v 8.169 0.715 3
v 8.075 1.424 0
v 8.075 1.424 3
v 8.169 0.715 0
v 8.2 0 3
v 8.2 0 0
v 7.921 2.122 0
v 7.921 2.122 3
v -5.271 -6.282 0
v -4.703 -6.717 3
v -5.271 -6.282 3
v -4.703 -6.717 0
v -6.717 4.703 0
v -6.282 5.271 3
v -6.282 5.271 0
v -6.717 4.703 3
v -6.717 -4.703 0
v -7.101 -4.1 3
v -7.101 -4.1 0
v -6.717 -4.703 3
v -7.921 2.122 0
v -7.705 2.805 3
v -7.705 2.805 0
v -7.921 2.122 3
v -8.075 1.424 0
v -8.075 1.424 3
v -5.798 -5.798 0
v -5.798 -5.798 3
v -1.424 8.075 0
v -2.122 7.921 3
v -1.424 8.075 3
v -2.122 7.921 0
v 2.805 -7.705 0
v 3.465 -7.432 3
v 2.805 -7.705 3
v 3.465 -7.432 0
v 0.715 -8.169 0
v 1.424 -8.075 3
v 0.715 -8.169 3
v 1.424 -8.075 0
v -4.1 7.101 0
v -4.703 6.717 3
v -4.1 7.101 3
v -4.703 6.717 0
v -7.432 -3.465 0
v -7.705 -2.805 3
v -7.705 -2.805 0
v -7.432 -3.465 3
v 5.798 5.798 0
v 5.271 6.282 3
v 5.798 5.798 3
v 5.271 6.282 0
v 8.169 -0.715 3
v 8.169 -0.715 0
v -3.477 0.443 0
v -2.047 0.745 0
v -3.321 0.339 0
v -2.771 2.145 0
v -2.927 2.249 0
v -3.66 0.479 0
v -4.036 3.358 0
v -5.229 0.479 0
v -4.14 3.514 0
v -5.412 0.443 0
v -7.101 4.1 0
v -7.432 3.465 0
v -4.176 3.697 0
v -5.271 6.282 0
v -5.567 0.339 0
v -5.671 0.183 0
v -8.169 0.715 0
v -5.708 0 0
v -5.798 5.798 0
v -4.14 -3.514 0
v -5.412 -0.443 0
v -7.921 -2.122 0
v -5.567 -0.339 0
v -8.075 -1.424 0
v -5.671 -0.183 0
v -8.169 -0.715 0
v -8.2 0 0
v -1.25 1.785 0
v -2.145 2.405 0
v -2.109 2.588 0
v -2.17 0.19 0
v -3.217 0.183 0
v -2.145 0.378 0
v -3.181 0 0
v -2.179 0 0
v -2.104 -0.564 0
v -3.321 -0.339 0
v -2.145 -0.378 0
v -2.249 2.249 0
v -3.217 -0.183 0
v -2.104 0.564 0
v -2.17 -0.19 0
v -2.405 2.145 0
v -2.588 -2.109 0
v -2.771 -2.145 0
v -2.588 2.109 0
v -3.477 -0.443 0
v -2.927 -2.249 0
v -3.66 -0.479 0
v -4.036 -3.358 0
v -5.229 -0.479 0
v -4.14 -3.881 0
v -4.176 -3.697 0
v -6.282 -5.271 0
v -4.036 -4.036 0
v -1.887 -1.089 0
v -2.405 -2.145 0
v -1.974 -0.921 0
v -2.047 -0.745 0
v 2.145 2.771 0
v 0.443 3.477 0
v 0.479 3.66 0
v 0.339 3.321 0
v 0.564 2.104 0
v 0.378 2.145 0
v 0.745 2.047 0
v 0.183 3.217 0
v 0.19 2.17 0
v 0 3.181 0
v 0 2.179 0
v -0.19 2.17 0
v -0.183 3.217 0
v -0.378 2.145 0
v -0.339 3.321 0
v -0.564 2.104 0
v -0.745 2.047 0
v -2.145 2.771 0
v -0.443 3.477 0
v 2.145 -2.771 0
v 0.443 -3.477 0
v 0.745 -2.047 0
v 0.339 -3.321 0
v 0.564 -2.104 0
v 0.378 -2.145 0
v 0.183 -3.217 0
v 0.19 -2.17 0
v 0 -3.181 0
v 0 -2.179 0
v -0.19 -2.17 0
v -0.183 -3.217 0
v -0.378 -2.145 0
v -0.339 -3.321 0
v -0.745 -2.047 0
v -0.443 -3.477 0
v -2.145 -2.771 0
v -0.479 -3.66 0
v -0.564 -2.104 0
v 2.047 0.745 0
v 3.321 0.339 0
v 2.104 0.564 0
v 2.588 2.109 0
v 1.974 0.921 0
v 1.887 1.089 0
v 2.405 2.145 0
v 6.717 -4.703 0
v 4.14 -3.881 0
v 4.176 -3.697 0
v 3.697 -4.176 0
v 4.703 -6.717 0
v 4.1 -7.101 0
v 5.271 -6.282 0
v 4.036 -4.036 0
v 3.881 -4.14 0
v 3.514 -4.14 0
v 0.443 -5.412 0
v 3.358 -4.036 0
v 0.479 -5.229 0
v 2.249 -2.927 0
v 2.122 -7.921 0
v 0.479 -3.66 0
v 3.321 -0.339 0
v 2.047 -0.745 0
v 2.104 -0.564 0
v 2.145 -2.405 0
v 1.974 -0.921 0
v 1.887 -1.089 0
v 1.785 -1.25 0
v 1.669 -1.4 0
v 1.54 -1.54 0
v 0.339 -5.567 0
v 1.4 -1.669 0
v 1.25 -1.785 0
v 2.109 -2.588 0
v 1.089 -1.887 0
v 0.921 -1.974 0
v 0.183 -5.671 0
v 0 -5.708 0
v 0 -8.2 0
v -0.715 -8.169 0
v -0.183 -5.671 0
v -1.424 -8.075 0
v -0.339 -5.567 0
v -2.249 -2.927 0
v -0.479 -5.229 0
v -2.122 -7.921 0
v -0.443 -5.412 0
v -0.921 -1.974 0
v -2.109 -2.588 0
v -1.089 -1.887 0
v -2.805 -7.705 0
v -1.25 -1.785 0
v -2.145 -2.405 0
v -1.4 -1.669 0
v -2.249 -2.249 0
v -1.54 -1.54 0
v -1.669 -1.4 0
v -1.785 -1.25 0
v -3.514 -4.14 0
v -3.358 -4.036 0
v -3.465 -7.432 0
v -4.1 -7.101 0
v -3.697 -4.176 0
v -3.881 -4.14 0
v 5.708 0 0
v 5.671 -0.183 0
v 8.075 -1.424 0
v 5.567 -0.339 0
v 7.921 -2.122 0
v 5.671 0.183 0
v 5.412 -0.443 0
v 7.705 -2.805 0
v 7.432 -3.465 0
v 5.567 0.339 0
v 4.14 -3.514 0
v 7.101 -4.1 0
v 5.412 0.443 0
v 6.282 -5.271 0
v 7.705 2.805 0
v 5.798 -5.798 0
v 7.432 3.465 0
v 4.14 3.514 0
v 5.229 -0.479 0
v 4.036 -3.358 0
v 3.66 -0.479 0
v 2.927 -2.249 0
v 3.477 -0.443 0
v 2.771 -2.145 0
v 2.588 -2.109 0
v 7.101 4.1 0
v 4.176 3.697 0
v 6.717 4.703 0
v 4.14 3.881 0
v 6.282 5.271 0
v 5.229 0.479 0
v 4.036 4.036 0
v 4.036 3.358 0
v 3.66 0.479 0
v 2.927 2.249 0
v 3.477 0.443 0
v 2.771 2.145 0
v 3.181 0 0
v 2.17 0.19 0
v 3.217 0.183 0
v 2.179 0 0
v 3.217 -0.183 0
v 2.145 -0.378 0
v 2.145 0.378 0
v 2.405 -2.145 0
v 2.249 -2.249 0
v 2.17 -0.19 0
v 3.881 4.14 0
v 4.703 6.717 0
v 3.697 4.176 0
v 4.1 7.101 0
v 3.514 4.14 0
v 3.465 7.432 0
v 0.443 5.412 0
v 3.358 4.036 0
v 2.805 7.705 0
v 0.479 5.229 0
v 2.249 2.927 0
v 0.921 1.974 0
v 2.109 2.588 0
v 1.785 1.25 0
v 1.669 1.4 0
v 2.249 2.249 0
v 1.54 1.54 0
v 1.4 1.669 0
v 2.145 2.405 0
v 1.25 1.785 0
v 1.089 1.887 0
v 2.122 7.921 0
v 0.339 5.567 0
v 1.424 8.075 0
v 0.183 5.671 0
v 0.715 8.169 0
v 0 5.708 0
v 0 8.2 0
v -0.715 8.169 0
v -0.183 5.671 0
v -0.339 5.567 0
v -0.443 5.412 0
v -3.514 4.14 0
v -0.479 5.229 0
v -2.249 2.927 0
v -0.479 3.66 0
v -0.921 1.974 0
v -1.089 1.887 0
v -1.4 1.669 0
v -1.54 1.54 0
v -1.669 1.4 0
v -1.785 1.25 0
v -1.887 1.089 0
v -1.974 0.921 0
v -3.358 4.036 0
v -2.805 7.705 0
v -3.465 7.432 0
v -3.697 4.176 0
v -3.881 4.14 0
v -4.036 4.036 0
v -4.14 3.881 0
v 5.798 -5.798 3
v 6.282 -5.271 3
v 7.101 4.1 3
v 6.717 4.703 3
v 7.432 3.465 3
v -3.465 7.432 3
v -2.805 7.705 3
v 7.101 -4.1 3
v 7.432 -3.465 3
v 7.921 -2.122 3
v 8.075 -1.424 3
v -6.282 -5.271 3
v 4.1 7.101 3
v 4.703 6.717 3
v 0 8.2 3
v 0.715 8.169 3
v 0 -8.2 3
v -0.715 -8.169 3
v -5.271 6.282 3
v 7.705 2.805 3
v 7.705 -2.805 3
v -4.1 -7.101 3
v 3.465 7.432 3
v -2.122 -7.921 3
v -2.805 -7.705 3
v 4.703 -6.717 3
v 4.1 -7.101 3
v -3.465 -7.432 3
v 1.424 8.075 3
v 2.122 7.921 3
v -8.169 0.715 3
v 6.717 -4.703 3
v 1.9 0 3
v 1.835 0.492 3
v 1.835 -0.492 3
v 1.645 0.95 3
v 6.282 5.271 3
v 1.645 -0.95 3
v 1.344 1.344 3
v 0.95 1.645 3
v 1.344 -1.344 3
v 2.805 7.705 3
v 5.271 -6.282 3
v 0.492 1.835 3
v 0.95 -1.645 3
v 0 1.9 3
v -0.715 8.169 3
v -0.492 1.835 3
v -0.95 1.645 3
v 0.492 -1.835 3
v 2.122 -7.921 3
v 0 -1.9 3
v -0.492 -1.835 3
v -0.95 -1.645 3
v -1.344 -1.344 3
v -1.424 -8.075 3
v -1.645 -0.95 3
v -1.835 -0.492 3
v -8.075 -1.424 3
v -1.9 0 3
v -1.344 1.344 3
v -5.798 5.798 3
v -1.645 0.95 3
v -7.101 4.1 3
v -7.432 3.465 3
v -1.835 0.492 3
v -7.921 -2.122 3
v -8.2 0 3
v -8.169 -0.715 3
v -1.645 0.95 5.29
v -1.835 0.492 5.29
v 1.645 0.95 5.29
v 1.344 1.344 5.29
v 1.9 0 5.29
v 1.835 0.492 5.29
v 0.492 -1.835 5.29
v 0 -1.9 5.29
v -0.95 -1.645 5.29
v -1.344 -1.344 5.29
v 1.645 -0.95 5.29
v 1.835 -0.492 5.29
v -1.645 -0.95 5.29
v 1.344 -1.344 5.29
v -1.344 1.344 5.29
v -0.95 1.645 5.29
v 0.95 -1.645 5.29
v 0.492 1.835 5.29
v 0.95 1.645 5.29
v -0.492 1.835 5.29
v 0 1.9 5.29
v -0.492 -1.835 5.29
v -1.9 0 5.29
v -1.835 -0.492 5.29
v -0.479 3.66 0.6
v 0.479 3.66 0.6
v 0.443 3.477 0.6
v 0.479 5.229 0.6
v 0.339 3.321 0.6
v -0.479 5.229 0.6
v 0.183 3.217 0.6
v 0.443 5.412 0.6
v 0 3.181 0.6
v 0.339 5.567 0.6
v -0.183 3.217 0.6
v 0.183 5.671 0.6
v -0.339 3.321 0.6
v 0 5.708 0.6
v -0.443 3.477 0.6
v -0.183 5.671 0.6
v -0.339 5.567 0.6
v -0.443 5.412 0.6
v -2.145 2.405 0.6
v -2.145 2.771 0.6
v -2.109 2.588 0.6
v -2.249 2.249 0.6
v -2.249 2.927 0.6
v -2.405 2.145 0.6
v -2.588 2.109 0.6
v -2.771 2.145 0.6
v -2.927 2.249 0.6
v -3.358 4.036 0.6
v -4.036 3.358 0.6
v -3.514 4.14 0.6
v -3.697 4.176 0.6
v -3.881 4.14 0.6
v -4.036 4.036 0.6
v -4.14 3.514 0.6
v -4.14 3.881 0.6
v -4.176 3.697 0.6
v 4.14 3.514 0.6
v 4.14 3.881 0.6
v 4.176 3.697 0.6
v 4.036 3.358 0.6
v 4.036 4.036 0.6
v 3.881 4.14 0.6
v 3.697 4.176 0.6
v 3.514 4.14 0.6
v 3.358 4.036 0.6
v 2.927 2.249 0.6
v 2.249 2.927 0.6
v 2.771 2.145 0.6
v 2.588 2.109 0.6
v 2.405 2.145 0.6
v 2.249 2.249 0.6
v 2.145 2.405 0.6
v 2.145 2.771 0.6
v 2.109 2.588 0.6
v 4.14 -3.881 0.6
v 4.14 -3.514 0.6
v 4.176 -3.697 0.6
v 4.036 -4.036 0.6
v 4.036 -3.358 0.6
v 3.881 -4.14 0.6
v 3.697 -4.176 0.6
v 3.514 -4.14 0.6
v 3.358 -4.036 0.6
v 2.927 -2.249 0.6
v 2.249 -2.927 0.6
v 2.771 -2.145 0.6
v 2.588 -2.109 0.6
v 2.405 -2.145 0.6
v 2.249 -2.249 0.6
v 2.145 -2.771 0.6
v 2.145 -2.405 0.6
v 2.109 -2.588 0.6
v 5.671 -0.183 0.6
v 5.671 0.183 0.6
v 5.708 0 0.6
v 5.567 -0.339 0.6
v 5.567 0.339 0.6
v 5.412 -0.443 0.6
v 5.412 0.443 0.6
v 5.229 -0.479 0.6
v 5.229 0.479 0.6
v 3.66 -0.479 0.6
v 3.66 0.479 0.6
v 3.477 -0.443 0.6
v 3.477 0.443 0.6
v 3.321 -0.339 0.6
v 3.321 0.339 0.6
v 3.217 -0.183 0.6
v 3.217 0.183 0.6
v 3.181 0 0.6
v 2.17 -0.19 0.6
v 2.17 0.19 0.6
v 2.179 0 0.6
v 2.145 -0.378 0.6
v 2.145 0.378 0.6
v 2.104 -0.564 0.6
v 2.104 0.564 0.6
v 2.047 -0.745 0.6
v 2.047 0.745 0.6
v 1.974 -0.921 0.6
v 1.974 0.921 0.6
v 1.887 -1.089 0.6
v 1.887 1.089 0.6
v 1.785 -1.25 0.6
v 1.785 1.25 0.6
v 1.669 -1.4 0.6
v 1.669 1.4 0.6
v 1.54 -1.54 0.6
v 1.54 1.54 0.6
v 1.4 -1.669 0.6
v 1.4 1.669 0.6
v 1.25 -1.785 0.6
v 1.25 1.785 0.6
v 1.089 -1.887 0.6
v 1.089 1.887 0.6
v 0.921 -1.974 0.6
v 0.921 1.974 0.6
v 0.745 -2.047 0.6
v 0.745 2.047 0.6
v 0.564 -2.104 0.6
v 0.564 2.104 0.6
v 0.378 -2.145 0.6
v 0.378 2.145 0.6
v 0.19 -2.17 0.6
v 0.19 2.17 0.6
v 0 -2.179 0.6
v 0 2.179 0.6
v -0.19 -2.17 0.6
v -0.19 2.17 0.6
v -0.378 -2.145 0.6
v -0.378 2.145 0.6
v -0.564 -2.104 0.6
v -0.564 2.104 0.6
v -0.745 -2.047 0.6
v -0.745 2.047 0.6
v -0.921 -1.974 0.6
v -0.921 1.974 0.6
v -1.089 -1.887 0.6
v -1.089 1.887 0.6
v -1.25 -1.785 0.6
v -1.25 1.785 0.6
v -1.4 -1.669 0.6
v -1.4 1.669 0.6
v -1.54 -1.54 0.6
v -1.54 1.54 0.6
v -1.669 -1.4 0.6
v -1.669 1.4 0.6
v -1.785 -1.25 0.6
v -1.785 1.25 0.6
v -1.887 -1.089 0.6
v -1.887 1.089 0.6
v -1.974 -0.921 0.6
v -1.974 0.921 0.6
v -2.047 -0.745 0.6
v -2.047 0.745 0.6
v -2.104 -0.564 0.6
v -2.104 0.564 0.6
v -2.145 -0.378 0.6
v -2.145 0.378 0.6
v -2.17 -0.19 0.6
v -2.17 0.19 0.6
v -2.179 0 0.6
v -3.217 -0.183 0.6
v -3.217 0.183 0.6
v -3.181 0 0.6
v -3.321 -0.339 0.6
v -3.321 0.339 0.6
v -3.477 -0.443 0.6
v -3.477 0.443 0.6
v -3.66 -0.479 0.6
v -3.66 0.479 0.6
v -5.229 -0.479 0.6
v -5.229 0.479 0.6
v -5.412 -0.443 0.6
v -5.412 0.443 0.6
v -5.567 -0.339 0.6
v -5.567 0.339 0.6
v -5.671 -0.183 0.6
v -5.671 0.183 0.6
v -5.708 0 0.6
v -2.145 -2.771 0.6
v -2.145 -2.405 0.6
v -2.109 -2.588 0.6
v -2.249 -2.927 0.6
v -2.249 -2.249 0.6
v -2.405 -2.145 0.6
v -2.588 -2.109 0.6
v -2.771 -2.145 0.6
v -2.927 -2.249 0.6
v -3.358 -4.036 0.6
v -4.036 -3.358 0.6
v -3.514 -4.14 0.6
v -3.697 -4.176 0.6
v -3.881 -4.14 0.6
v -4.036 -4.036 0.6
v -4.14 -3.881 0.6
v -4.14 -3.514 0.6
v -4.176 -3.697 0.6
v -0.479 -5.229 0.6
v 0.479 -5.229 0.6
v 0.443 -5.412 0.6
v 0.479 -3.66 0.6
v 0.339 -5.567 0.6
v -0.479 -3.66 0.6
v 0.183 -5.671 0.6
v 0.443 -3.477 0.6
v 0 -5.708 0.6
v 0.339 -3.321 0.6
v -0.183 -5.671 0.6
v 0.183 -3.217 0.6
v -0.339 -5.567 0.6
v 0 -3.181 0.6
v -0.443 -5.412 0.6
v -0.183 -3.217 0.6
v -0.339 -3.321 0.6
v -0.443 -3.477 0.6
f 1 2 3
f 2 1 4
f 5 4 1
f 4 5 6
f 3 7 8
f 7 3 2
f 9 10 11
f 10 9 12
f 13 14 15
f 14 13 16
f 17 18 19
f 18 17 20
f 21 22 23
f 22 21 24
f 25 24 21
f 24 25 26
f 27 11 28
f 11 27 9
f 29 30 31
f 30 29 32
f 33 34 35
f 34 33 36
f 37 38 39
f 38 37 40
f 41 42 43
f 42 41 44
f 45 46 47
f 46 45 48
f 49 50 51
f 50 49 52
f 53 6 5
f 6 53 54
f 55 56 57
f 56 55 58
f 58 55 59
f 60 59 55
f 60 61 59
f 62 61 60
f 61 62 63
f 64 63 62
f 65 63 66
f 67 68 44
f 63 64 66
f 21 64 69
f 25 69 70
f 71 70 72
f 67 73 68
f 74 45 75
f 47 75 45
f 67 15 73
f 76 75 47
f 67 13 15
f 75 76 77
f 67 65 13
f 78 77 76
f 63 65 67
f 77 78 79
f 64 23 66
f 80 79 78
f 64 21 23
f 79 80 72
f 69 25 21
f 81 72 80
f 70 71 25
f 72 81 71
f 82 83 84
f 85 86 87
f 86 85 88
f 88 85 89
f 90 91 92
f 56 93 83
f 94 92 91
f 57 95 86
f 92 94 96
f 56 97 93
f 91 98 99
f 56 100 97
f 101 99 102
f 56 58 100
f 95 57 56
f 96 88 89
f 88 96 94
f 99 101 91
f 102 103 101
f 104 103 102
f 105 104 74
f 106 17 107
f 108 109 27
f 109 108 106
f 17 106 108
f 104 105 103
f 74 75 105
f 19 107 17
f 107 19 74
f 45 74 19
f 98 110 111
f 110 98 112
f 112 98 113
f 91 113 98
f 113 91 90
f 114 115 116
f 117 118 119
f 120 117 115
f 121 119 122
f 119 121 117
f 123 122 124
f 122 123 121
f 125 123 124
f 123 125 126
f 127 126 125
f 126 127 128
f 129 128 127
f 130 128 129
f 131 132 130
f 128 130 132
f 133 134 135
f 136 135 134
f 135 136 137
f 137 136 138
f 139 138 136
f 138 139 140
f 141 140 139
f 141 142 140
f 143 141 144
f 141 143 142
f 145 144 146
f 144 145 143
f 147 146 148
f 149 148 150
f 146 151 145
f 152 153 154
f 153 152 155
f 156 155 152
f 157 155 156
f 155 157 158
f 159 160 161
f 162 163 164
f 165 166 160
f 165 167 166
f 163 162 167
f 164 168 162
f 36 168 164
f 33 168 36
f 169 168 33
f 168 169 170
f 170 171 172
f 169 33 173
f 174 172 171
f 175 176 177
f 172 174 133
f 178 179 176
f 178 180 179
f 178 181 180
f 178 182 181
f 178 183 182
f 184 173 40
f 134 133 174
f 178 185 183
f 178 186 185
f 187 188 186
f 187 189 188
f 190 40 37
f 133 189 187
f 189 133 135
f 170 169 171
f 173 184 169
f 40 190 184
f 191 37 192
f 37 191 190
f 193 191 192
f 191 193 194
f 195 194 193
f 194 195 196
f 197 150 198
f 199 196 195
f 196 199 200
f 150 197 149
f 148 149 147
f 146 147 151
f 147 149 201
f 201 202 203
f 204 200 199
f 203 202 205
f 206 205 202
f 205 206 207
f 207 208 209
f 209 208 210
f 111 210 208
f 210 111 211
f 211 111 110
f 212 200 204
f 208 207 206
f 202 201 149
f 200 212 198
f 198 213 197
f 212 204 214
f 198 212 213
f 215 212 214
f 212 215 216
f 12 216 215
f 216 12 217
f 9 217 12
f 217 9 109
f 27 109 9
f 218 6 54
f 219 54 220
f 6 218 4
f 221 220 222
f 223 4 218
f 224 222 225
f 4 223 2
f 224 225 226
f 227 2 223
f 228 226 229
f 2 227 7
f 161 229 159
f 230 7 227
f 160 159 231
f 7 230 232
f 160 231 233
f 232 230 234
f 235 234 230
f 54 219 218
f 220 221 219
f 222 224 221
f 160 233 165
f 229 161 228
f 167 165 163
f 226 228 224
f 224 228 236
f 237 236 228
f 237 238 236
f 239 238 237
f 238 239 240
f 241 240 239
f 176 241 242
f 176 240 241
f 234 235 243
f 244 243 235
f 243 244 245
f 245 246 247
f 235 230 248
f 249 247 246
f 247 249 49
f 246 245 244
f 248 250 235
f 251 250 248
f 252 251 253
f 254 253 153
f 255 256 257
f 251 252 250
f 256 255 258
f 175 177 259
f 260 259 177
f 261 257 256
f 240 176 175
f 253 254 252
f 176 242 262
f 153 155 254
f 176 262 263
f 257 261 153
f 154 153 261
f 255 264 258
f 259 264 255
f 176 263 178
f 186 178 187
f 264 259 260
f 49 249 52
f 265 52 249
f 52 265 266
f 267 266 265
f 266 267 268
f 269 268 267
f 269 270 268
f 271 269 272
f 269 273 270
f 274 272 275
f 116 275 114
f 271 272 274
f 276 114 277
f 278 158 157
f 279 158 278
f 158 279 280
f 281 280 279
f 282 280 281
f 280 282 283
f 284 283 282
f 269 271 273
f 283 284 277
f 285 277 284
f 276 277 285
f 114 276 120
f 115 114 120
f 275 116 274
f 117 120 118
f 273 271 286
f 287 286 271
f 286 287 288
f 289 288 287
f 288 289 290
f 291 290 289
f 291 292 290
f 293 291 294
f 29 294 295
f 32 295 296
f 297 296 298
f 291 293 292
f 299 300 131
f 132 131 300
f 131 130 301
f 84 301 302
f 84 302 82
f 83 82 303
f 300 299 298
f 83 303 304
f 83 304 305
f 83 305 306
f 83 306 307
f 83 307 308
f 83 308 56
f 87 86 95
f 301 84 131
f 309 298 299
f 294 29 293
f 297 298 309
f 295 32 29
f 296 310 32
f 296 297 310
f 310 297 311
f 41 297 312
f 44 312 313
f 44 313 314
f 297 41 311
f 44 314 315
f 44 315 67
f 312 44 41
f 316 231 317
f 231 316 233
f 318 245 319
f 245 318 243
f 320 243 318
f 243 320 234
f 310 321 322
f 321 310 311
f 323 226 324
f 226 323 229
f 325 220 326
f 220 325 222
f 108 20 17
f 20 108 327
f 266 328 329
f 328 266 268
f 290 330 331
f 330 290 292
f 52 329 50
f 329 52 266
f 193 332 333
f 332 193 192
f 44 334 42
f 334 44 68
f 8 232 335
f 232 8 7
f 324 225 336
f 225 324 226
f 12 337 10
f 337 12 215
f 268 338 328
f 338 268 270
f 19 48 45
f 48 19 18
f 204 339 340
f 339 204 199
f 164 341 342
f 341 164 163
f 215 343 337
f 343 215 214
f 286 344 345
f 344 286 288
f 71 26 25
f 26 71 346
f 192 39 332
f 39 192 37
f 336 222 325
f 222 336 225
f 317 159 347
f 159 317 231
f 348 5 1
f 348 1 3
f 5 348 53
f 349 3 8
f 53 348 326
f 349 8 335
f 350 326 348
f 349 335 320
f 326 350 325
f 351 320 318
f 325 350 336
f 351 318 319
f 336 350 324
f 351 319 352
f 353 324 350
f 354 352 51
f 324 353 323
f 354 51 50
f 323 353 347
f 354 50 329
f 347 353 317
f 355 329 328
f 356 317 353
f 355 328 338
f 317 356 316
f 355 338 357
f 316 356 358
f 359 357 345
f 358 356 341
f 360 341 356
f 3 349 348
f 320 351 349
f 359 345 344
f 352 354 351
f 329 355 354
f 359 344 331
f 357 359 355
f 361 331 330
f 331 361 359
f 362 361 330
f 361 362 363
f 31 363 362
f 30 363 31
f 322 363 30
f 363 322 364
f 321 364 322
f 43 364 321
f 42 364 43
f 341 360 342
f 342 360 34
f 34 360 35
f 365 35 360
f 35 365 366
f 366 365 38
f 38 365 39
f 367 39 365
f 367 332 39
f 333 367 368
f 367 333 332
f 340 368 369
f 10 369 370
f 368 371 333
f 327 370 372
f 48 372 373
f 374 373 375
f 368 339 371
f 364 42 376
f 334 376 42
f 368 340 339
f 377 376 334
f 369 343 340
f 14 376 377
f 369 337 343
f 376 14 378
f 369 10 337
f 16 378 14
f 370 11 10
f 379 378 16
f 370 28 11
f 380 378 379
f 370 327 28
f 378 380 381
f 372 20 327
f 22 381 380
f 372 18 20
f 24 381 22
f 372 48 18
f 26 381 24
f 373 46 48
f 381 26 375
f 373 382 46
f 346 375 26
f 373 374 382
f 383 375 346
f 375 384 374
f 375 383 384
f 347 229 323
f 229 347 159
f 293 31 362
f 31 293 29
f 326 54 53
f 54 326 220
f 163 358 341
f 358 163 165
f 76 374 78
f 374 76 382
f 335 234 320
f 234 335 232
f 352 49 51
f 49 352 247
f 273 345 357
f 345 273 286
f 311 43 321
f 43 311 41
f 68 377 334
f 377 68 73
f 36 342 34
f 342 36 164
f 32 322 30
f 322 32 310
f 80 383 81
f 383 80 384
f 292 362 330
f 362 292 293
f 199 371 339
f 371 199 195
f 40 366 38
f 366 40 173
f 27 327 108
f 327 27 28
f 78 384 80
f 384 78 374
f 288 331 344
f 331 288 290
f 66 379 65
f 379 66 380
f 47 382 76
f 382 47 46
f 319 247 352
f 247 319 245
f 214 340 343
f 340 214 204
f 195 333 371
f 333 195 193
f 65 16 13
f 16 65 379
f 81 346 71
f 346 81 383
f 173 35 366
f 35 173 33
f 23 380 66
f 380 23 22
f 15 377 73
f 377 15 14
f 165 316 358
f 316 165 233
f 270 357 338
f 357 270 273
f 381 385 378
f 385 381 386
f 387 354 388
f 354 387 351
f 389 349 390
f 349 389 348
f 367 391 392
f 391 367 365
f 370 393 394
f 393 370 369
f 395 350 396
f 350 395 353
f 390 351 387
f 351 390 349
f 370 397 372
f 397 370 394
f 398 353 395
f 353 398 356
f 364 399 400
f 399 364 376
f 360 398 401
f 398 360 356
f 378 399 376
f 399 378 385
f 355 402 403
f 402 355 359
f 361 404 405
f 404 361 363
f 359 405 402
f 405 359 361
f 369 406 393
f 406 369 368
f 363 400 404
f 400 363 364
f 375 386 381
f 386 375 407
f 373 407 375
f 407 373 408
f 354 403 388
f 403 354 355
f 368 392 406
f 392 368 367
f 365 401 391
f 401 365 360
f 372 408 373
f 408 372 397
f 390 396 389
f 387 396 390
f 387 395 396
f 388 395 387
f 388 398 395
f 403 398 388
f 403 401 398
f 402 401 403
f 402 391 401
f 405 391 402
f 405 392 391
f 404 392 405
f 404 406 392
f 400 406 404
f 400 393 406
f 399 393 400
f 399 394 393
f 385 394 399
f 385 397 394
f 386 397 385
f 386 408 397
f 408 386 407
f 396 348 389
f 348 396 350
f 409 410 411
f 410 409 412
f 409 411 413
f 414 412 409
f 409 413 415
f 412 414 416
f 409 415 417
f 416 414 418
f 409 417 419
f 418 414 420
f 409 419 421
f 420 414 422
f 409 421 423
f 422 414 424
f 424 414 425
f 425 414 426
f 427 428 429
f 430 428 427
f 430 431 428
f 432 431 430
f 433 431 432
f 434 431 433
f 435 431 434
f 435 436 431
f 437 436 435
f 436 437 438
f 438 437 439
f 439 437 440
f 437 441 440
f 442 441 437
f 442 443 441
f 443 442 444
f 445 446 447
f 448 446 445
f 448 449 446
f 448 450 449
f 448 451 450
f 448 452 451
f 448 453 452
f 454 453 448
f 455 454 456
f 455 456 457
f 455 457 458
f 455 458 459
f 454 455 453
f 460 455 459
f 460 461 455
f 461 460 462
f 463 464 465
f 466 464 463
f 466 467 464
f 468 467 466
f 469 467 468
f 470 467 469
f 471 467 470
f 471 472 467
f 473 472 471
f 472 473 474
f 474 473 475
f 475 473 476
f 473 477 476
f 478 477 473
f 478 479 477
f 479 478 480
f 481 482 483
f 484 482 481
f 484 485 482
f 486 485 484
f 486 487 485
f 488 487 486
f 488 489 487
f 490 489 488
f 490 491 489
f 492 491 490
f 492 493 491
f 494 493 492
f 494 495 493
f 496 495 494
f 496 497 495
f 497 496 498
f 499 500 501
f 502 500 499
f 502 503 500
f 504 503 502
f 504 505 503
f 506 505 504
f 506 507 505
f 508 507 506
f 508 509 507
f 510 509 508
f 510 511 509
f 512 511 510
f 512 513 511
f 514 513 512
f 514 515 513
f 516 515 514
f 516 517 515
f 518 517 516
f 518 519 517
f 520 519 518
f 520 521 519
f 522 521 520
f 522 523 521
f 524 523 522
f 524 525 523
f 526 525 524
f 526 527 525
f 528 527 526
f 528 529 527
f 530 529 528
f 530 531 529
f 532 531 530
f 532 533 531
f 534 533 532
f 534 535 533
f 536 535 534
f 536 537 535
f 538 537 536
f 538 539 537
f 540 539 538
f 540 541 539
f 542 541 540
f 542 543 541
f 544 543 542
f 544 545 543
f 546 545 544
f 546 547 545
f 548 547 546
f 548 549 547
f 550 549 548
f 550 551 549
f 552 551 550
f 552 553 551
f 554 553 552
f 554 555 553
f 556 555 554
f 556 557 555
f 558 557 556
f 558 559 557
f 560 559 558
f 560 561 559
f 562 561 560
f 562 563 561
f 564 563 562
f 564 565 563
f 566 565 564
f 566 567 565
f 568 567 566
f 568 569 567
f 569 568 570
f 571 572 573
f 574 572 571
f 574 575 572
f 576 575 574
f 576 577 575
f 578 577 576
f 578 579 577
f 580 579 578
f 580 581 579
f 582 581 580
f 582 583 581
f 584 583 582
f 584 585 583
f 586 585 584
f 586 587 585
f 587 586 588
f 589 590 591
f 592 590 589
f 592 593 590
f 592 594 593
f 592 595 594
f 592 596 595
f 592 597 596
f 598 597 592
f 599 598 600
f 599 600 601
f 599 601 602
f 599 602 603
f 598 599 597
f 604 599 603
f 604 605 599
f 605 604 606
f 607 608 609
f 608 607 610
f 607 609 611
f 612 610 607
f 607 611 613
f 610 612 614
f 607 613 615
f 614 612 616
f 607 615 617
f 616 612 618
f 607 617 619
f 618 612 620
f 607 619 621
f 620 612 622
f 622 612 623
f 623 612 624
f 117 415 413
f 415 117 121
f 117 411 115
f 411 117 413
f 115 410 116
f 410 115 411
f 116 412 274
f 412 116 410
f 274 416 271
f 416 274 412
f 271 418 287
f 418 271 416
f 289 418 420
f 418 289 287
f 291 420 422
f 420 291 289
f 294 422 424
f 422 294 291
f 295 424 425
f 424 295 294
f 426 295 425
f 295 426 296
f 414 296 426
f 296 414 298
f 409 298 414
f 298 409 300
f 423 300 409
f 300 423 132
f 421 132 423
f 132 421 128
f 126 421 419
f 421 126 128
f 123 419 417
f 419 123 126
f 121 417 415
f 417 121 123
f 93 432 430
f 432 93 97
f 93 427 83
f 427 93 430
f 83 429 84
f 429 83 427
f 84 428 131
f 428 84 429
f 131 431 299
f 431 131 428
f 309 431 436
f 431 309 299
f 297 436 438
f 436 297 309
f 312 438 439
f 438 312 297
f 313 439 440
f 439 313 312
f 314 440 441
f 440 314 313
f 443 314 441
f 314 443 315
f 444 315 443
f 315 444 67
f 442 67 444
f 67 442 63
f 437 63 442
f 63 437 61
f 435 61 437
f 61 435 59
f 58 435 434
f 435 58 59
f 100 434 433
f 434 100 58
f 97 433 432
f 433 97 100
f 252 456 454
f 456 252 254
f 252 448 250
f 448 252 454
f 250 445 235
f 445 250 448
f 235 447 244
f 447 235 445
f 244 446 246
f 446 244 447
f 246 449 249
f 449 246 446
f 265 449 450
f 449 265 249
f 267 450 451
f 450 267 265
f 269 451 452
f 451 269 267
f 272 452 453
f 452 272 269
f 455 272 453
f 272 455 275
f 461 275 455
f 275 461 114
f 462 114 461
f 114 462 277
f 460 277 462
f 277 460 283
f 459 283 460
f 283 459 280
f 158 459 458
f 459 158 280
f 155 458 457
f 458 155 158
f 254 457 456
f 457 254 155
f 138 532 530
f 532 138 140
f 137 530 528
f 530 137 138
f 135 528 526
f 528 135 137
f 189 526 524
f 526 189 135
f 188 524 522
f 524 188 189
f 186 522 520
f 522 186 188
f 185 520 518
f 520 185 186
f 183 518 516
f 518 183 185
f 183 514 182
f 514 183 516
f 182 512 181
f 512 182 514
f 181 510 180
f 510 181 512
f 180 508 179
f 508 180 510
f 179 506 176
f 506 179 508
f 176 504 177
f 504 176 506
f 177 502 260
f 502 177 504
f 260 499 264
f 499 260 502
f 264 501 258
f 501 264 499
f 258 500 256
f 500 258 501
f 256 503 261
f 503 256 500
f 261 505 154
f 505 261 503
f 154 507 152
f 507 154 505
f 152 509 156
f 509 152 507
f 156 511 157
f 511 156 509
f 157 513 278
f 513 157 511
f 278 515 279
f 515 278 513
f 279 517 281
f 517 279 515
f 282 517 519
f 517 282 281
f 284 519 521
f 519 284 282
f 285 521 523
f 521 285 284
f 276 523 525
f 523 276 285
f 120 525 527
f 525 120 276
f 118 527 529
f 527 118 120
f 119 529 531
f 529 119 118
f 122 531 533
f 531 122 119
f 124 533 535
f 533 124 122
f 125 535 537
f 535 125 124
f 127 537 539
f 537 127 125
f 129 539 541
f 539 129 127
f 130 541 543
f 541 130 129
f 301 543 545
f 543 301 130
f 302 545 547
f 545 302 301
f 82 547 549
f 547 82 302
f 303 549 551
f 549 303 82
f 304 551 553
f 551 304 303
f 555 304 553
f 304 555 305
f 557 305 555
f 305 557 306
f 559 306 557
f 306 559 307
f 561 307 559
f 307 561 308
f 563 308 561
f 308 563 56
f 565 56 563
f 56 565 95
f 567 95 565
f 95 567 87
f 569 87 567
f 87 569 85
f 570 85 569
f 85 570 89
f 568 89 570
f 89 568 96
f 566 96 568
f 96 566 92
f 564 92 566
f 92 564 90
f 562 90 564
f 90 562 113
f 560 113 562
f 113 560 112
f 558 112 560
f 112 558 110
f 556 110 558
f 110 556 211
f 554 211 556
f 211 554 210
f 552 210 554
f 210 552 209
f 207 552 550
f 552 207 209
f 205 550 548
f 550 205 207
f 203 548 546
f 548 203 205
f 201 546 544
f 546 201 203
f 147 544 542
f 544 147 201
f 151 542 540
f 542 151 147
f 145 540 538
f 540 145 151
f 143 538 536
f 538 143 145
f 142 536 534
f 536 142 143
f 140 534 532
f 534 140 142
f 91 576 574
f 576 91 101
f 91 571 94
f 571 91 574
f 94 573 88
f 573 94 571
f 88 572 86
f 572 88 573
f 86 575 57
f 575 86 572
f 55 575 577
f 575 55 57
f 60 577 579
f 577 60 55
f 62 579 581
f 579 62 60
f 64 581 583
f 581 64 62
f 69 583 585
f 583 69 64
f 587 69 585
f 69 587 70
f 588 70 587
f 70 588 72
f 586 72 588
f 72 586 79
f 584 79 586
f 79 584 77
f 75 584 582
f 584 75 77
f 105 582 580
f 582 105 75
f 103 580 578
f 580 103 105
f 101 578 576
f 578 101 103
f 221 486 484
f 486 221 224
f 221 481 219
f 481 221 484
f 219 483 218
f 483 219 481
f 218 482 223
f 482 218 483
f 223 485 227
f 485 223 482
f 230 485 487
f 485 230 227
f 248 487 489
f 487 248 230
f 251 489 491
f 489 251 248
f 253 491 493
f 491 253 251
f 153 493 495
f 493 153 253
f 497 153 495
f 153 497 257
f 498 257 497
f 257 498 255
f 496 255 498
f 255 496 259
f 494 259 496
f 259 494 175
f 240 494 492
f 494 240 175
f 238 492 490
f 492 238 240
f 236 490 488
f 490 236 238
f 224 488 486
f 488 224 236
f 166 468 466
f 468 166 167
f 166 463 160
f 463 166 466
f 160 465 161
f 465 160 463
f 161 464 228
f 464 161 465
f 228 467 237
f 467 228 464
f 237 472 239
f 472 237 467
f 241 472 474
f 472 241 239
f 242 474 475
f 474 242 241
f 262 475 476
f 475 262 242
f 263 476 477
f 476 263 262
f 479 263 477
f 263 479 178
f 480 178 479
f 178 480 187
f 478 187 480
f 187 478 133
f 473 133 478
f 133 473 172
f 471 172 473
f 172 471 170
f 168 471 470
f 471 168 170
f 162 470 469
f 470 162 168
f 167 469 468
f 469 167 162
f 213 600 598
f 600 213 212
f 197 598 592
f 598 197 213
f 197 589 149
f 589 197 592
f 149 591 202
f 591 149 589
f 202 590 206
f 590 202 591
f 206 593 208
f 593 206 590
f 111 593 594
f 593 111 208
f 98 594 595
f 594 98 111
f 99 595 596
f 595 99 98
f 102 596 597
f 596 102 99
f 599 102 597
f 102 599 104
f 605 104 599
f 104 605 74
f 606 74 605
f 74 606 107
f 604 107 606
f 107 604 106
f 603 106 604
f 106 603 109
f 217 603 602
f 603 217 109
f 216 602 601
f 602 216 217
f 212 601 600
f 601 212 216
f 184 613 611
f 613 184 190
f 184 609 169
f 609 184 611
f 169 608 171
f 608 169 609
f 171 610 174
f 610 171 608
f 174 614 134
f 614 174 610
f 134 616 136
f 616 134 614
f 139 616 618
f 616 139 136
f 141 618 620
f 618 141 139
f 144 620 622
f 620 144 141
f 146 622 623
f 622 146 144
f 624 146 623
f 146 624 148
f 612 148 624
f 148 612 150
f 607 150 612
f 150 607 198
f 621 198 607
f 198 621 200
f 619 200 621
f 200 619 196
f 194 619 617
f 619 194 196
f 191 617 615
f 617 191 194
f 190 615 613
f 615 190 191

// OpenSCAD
// Shadow Fleet -- the small printed pieces (2026-11-20, for the MakerWorld launch).
//
// WORLD-CLAIM TOKEN: sits in a world's 17 mm slot (peg into the 4.2 mm hole) to show who holds it. Its face carries the
// faction's symbol -- the game's own ORIGINAL insignia (sun / hex / diamond / crescent, same as the phone's insigniaSvg),
// never a real Star Wars emblem. FLEET MARKER: the A3 marker (7.5 mm cap, peg into a 3.2 mm fleet hole), bolder number.
//
// ENGRAVED, like the fleet markers already printed (user 2026-11-20: no inlays -- "too hard to print without 0.2mm nozzle").
// Both print FACE DOWN (crisp face on the bed, no supports; the peg points up); the face is mirrored so it reads right once
// flipped. The symbol / number is sunk 0.6 mm (3 layers at 0.2) and every line is at least ~1 mm wide for a 0.4 nozzle.
// Second colour: paint it by hand, or in Bambu Studio use colour painting on the engraved faces (AMS).
//
//   openscad -D 'PIECE="token"' -D FACTION=0 -o token_rebels.stl shadowfleet_pieces.scad
//   tools/board/make_pieces.sh exports the full set into tools/board/out/pieces/.

PIECE   = "token";    // "token" | "fleet" | "sheet" (a preview of everything)
FACTION = 0;          // 0 Rebels (sun), 1 Empire (hex), 2 Pykes (diamond), 3 Crimson Dawn (crescent)
NUMBER  = 1;          // fleet marker number

// fits (match tools/board/shadowfleet_board_b17.scad)
SLOT_D = 17; SLOT_DEPTH = 1.6; PEG_HOLE_D = 4.2; PEG_HOLE_DEPTH = 2.6; FLEET_HOLE_D = 3.2;
TOKEN_D = SLOT_D - 0.6;        // 16.4
TOKEN_H = SLOT_DEPTH + 1.4;    // 3.0: stands 1.4 mm proud of the map
ENGRAVE = 0.6;                 // engraving depth
SYM = 12.2;                    // symbol size on the token face
FLEET_CAP_D = 7.5; FLEET_CAP_H = 2.4;
$fn = 72;

// ---- the four insignia, drawn on the phone's 28-unit grid, centred (lines >= 2.2 units = ~0.96 mm) ----
module ray(a, b, w) { hull() { translate(a) circle(d = w, $fn = 16); translate(b) circle(d = w, $fn = 16); } }
module insignia(f) {
  translate([-14, -14]) {
    if (f == 0) {         // the sun: a disc and eight rays
      translate([14, 14]) circle(r = 5);
      for (k = [0 : 7]) let (a = k * 45) ray([14 + 8.4 * cos(a), 14 + 8.4 * sin(a)], [14 + 12 * cos(a), 14 + 12 * sin(a)], 2.2);
    } else if (f == 1) {  // the hex: a ring and a core
      translate([14, 14]) { difference() { circle(r = 12, $fn = 6); circle(r = 9.8, $fn = 6); } circle(r = 4.5); }
    } else if (f == 2) {  // the diamond: a ring and a core
      translate([14, 14]) { difference() { rotate(45) square(17, center = true); rotate(45) square(12.6, center = true); } circle(r = 4); }
    } else {              // the crescent (the phone's path: a r 11 disc minus a r 10 disc to its right)
      difference() { translate([14.42, 14]) circle(r = 11); translate([19, 14]) circle(r = 10); }
    }
  }
}
module face2d(f) { mirror([1, 0]) scale(SYM / 28) insignia(f); }   // mirrored: printed face down

module token(f) {
  difference() {
    union() {
      cylinder(d = TOKEN_D, h = TOKEN_H);
      translate([0, 0, TOKEN_H - 0.01]) cylinder(d = PEG_HOLE_D - 0.4, h = PEG_HOLE_DEPTH - 0.3, $fn = 24);
    }
    translate([0, 0, -0.01]) linear_extrude(ENGRAVE + 0.01) face2d(f);
  }
}

module num2d(n) { mirror([1, 0]) text(str(n), size = 5.4, font = "Liberation Sans:style=Bold", halign = "center", valign = "center"); }
module fleet(n) {
  difference() {
    union() {
      cylinder(d = FLEET_CAP_D, h = FLEET_CAP_H, $fn = 40);
      translate([0, 0, FLEET_CAP_H - 0.01]) cylinder(d = 3.6, h = 3, $fn = 24);                     // stem
      translate([0, 0, FLEET_CAP_H + 3 - 0.02]) cylinder(d = FLEET_HOLE_D - 0.3, h = 2.2, $fn = 16);  // peg
    }
    translate([0, 0, -0.01]) linear_extrude(ENGRAVE + 0.01) num2d(n);
  }
}

FCOL = ["#FFC933", "#E6EEF5", "#9B5FE0", "#D0343E"];
if (PIECE == "token") token(FACTION);
else if (PIECE == "fleet") fleet(NUMBER);
else if (PIECE == "sheet") {   // preview: face up, the engraving filled with paint
  for (f = [0 : 3]) translate([f * 22, 0, 0]) rotate([0, 180, 0]) {
    color("#1B2230") token(f);
    color(FCOL[f]) translate([0, 0, 0.05]) linear_extrude(ENGRAVE - 0.1) face2d(f);
  }
  for (n = [1 : 3]) translate([(n - 1) * 14 + 12, -22, 0]) rotate([0, 180, 0]) {
    color("#C8364A") fleet(n);
    color("#F2F2F2") translate([0, 0, 0.05]) linear_extrude(ENGRAVE - 0.1) num2d(n);
  }
}
